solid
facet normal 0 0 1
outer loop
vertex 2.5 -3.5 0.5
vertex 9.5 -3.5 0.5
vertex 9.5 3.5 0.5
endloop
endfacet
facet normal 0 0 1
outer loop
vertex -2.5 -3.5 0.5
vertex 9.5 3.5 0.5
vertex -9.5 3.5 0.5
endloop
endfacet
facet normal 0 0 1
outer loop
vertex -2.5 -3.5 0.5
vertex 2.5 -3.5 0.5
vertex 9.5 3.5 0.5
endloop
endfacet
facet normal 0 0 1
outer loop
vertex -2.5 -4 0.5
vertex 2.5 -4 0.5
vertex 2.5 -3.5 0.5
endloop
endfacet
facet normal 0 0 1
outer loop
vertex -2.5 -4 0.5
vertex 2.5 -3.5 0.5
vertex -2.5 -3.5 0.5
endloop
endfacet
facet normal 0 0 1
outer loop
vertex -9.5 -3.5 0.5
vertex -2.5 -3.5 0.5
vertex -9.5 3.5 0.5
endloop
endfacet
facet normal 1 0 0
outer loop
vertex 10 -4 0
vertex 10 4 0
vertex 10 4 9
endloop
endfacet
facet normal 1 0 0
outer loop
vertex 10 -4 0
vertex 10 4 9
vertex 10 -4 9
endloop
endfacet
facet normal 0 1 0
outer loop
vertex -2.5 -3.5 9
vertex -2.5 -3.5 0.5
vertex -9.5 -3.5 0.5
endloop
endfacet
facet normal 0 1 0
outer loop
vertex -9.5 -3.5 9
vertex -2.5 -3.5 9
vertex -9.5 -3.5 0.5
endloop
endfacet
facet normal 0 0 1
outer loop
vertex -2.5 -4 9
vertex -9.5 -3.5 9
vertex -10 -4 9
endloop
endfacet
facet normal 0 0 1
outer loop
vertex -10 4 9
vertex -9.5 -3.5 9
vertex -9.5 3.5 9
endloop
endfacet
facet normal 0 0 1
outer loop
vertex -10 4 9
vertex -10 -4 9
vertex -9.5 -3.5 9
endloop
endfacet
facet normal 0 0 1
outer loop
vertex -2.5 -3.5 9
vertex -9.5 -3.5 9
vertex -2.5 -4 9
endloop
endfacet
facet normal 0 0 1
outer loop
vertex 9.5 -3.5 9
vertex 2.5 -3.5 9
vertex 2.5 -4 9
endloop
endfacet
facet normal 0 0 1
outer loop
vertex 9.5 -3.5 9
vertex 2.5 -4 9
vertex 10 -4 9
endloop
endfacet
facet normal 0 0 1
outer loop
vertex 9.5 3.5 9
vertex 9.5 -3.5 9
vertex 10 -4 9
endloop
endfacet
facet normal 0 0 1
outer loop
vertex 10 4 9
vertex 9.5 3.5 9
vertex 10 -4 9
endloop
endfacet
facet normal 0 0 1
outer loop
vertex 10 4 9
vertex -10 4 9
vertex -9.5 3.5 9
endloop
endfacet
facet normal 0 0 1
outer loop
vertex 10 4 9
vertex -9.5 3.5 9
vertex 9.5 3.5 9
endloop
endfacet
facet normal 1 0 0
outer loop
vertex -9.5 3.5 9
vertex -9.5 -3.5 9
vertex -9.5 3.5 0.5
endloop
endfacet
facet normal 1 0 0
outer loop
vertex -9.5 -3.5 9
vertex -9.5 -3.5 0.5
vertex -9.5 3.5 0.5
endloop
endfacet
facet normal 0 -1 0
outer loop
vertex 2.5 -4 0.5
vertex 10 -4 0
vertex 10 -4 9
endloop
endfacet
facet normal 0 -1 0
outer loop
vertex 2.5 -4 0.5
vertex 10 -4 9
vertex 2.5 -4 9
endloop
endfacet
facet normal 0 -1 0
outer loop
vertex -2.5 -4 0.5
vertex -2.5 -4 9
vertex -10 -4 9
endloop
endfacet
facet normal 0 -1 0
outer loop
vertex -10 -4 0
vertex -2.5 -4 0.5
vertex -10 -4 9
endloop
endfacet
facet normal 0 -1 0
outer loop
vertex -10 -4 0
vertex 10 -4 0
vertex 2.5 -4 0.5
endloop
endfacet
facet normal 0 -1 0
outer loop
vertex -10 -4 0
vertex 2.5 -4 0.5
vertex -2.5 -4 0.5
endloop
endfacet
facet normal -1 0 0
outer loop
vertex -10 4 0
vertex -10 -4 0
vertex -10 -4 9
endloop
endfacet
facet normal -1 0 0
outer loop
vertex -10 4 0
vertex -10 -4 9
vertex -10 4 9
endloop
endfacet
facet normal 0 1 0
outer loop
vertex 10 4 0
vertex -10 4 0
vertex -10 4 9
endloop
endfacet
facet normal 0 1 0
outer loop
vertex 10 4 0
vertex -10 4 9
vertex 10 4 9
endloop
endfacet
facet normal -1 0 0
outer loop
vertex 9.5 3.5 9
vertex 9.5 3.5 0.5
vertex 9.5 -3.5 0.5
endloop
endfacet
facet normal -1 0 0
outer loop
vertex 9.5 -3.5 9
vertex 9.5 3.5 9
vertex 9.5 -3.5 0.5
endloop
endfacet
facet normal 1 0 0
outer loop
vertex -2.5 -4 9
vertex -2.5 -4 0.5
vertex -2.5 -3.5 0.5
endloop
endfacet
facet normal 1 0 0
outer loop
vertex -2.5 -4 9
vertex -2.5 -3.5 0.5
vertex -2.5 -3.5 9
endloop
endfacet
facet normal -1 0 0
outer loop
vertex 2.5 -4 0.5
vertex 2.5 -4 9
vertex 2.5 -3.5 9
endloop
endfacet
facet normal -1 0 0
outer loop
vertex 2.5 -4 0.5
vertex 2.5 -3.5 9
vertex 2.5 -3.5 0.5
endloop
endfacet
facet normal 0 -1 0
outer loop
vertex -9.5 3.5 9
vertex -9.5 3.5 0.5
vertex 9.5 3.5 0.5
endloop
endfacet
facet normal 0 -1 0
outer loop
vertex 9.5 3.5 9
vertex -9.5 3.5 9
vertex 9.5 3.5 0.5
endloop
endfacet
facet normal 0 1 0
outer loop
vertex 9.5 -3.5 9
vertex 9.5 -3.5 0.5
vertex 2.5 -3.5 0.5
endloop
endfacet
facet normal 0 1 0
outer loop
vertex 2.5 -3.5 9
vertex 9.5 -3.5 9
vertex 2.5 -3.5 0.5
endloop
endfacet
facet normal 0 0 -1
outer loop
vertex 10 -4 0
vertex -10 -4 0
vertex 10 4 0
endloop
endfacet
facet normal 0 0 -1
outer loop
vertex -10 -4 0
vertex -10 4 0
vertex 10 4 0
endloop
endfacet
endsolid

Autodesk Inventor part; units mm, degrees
ref_plane "YZ Plane" through (0, 0, 0) normal (1, 0, 0) x (0, 1, 0)
ref_plane "XZ Plane" through (0, 0, 0) normal (0, 1, 0) x (-1, 0, 0)
ref_plane "XY Plane" through (0, 0, 0) normal (0, 0, 1) x (1, 0, 0)
sketch "Sketch1" plane through (0, 0, 0) normal (0, 0, 1) x (1, 0, 0)
  line L0 (0, 6.4) -> (0, -4.8) projected
  line L1 (-12, 0) -> (16, 0) projected
  line L2 (-10, 4) -> (10, 4)
  line L3 (10, 4) -> (10, -4)
  line L4 (10, -4) -> (-10, -4)
  line L5 (-10, -4) -> (-10, 4)
  dimension "d0" = 20
  dimension "d1" = 8
extrude "Extrusion1" add sketch "Sketch1" along normal blind 9
shell "Shell1" thickness 0.5 removed faces 1 at (3.3333, -1.3333, 9)
sketch "Sketch2" plane through (-10, -4, 0) normal (0, -1, 0) x (1, 0, 0)
  line L0 (20, 9) -> (0, 9) construction
  line L1 (19.5, 0.5) -> (0.5, 0.5) construction
  line L2 (10, 11.7) -> (10, -0.9) construction
  line L3 (7.5, 9) -> (12.5, 9)
  line L4 (12.5, 9) -> (12.5, 0.5)
  line L5 (12.5, 0.5) -> (7.5, 0.5)
  line L6 (7.5, 0.5) -> (7.5, 9)
  dimension "d5" = 5
extrude "Extrusion2" cut sketch "Sketch2" against normal up to next
properties part number "config - c9g5 connector"
